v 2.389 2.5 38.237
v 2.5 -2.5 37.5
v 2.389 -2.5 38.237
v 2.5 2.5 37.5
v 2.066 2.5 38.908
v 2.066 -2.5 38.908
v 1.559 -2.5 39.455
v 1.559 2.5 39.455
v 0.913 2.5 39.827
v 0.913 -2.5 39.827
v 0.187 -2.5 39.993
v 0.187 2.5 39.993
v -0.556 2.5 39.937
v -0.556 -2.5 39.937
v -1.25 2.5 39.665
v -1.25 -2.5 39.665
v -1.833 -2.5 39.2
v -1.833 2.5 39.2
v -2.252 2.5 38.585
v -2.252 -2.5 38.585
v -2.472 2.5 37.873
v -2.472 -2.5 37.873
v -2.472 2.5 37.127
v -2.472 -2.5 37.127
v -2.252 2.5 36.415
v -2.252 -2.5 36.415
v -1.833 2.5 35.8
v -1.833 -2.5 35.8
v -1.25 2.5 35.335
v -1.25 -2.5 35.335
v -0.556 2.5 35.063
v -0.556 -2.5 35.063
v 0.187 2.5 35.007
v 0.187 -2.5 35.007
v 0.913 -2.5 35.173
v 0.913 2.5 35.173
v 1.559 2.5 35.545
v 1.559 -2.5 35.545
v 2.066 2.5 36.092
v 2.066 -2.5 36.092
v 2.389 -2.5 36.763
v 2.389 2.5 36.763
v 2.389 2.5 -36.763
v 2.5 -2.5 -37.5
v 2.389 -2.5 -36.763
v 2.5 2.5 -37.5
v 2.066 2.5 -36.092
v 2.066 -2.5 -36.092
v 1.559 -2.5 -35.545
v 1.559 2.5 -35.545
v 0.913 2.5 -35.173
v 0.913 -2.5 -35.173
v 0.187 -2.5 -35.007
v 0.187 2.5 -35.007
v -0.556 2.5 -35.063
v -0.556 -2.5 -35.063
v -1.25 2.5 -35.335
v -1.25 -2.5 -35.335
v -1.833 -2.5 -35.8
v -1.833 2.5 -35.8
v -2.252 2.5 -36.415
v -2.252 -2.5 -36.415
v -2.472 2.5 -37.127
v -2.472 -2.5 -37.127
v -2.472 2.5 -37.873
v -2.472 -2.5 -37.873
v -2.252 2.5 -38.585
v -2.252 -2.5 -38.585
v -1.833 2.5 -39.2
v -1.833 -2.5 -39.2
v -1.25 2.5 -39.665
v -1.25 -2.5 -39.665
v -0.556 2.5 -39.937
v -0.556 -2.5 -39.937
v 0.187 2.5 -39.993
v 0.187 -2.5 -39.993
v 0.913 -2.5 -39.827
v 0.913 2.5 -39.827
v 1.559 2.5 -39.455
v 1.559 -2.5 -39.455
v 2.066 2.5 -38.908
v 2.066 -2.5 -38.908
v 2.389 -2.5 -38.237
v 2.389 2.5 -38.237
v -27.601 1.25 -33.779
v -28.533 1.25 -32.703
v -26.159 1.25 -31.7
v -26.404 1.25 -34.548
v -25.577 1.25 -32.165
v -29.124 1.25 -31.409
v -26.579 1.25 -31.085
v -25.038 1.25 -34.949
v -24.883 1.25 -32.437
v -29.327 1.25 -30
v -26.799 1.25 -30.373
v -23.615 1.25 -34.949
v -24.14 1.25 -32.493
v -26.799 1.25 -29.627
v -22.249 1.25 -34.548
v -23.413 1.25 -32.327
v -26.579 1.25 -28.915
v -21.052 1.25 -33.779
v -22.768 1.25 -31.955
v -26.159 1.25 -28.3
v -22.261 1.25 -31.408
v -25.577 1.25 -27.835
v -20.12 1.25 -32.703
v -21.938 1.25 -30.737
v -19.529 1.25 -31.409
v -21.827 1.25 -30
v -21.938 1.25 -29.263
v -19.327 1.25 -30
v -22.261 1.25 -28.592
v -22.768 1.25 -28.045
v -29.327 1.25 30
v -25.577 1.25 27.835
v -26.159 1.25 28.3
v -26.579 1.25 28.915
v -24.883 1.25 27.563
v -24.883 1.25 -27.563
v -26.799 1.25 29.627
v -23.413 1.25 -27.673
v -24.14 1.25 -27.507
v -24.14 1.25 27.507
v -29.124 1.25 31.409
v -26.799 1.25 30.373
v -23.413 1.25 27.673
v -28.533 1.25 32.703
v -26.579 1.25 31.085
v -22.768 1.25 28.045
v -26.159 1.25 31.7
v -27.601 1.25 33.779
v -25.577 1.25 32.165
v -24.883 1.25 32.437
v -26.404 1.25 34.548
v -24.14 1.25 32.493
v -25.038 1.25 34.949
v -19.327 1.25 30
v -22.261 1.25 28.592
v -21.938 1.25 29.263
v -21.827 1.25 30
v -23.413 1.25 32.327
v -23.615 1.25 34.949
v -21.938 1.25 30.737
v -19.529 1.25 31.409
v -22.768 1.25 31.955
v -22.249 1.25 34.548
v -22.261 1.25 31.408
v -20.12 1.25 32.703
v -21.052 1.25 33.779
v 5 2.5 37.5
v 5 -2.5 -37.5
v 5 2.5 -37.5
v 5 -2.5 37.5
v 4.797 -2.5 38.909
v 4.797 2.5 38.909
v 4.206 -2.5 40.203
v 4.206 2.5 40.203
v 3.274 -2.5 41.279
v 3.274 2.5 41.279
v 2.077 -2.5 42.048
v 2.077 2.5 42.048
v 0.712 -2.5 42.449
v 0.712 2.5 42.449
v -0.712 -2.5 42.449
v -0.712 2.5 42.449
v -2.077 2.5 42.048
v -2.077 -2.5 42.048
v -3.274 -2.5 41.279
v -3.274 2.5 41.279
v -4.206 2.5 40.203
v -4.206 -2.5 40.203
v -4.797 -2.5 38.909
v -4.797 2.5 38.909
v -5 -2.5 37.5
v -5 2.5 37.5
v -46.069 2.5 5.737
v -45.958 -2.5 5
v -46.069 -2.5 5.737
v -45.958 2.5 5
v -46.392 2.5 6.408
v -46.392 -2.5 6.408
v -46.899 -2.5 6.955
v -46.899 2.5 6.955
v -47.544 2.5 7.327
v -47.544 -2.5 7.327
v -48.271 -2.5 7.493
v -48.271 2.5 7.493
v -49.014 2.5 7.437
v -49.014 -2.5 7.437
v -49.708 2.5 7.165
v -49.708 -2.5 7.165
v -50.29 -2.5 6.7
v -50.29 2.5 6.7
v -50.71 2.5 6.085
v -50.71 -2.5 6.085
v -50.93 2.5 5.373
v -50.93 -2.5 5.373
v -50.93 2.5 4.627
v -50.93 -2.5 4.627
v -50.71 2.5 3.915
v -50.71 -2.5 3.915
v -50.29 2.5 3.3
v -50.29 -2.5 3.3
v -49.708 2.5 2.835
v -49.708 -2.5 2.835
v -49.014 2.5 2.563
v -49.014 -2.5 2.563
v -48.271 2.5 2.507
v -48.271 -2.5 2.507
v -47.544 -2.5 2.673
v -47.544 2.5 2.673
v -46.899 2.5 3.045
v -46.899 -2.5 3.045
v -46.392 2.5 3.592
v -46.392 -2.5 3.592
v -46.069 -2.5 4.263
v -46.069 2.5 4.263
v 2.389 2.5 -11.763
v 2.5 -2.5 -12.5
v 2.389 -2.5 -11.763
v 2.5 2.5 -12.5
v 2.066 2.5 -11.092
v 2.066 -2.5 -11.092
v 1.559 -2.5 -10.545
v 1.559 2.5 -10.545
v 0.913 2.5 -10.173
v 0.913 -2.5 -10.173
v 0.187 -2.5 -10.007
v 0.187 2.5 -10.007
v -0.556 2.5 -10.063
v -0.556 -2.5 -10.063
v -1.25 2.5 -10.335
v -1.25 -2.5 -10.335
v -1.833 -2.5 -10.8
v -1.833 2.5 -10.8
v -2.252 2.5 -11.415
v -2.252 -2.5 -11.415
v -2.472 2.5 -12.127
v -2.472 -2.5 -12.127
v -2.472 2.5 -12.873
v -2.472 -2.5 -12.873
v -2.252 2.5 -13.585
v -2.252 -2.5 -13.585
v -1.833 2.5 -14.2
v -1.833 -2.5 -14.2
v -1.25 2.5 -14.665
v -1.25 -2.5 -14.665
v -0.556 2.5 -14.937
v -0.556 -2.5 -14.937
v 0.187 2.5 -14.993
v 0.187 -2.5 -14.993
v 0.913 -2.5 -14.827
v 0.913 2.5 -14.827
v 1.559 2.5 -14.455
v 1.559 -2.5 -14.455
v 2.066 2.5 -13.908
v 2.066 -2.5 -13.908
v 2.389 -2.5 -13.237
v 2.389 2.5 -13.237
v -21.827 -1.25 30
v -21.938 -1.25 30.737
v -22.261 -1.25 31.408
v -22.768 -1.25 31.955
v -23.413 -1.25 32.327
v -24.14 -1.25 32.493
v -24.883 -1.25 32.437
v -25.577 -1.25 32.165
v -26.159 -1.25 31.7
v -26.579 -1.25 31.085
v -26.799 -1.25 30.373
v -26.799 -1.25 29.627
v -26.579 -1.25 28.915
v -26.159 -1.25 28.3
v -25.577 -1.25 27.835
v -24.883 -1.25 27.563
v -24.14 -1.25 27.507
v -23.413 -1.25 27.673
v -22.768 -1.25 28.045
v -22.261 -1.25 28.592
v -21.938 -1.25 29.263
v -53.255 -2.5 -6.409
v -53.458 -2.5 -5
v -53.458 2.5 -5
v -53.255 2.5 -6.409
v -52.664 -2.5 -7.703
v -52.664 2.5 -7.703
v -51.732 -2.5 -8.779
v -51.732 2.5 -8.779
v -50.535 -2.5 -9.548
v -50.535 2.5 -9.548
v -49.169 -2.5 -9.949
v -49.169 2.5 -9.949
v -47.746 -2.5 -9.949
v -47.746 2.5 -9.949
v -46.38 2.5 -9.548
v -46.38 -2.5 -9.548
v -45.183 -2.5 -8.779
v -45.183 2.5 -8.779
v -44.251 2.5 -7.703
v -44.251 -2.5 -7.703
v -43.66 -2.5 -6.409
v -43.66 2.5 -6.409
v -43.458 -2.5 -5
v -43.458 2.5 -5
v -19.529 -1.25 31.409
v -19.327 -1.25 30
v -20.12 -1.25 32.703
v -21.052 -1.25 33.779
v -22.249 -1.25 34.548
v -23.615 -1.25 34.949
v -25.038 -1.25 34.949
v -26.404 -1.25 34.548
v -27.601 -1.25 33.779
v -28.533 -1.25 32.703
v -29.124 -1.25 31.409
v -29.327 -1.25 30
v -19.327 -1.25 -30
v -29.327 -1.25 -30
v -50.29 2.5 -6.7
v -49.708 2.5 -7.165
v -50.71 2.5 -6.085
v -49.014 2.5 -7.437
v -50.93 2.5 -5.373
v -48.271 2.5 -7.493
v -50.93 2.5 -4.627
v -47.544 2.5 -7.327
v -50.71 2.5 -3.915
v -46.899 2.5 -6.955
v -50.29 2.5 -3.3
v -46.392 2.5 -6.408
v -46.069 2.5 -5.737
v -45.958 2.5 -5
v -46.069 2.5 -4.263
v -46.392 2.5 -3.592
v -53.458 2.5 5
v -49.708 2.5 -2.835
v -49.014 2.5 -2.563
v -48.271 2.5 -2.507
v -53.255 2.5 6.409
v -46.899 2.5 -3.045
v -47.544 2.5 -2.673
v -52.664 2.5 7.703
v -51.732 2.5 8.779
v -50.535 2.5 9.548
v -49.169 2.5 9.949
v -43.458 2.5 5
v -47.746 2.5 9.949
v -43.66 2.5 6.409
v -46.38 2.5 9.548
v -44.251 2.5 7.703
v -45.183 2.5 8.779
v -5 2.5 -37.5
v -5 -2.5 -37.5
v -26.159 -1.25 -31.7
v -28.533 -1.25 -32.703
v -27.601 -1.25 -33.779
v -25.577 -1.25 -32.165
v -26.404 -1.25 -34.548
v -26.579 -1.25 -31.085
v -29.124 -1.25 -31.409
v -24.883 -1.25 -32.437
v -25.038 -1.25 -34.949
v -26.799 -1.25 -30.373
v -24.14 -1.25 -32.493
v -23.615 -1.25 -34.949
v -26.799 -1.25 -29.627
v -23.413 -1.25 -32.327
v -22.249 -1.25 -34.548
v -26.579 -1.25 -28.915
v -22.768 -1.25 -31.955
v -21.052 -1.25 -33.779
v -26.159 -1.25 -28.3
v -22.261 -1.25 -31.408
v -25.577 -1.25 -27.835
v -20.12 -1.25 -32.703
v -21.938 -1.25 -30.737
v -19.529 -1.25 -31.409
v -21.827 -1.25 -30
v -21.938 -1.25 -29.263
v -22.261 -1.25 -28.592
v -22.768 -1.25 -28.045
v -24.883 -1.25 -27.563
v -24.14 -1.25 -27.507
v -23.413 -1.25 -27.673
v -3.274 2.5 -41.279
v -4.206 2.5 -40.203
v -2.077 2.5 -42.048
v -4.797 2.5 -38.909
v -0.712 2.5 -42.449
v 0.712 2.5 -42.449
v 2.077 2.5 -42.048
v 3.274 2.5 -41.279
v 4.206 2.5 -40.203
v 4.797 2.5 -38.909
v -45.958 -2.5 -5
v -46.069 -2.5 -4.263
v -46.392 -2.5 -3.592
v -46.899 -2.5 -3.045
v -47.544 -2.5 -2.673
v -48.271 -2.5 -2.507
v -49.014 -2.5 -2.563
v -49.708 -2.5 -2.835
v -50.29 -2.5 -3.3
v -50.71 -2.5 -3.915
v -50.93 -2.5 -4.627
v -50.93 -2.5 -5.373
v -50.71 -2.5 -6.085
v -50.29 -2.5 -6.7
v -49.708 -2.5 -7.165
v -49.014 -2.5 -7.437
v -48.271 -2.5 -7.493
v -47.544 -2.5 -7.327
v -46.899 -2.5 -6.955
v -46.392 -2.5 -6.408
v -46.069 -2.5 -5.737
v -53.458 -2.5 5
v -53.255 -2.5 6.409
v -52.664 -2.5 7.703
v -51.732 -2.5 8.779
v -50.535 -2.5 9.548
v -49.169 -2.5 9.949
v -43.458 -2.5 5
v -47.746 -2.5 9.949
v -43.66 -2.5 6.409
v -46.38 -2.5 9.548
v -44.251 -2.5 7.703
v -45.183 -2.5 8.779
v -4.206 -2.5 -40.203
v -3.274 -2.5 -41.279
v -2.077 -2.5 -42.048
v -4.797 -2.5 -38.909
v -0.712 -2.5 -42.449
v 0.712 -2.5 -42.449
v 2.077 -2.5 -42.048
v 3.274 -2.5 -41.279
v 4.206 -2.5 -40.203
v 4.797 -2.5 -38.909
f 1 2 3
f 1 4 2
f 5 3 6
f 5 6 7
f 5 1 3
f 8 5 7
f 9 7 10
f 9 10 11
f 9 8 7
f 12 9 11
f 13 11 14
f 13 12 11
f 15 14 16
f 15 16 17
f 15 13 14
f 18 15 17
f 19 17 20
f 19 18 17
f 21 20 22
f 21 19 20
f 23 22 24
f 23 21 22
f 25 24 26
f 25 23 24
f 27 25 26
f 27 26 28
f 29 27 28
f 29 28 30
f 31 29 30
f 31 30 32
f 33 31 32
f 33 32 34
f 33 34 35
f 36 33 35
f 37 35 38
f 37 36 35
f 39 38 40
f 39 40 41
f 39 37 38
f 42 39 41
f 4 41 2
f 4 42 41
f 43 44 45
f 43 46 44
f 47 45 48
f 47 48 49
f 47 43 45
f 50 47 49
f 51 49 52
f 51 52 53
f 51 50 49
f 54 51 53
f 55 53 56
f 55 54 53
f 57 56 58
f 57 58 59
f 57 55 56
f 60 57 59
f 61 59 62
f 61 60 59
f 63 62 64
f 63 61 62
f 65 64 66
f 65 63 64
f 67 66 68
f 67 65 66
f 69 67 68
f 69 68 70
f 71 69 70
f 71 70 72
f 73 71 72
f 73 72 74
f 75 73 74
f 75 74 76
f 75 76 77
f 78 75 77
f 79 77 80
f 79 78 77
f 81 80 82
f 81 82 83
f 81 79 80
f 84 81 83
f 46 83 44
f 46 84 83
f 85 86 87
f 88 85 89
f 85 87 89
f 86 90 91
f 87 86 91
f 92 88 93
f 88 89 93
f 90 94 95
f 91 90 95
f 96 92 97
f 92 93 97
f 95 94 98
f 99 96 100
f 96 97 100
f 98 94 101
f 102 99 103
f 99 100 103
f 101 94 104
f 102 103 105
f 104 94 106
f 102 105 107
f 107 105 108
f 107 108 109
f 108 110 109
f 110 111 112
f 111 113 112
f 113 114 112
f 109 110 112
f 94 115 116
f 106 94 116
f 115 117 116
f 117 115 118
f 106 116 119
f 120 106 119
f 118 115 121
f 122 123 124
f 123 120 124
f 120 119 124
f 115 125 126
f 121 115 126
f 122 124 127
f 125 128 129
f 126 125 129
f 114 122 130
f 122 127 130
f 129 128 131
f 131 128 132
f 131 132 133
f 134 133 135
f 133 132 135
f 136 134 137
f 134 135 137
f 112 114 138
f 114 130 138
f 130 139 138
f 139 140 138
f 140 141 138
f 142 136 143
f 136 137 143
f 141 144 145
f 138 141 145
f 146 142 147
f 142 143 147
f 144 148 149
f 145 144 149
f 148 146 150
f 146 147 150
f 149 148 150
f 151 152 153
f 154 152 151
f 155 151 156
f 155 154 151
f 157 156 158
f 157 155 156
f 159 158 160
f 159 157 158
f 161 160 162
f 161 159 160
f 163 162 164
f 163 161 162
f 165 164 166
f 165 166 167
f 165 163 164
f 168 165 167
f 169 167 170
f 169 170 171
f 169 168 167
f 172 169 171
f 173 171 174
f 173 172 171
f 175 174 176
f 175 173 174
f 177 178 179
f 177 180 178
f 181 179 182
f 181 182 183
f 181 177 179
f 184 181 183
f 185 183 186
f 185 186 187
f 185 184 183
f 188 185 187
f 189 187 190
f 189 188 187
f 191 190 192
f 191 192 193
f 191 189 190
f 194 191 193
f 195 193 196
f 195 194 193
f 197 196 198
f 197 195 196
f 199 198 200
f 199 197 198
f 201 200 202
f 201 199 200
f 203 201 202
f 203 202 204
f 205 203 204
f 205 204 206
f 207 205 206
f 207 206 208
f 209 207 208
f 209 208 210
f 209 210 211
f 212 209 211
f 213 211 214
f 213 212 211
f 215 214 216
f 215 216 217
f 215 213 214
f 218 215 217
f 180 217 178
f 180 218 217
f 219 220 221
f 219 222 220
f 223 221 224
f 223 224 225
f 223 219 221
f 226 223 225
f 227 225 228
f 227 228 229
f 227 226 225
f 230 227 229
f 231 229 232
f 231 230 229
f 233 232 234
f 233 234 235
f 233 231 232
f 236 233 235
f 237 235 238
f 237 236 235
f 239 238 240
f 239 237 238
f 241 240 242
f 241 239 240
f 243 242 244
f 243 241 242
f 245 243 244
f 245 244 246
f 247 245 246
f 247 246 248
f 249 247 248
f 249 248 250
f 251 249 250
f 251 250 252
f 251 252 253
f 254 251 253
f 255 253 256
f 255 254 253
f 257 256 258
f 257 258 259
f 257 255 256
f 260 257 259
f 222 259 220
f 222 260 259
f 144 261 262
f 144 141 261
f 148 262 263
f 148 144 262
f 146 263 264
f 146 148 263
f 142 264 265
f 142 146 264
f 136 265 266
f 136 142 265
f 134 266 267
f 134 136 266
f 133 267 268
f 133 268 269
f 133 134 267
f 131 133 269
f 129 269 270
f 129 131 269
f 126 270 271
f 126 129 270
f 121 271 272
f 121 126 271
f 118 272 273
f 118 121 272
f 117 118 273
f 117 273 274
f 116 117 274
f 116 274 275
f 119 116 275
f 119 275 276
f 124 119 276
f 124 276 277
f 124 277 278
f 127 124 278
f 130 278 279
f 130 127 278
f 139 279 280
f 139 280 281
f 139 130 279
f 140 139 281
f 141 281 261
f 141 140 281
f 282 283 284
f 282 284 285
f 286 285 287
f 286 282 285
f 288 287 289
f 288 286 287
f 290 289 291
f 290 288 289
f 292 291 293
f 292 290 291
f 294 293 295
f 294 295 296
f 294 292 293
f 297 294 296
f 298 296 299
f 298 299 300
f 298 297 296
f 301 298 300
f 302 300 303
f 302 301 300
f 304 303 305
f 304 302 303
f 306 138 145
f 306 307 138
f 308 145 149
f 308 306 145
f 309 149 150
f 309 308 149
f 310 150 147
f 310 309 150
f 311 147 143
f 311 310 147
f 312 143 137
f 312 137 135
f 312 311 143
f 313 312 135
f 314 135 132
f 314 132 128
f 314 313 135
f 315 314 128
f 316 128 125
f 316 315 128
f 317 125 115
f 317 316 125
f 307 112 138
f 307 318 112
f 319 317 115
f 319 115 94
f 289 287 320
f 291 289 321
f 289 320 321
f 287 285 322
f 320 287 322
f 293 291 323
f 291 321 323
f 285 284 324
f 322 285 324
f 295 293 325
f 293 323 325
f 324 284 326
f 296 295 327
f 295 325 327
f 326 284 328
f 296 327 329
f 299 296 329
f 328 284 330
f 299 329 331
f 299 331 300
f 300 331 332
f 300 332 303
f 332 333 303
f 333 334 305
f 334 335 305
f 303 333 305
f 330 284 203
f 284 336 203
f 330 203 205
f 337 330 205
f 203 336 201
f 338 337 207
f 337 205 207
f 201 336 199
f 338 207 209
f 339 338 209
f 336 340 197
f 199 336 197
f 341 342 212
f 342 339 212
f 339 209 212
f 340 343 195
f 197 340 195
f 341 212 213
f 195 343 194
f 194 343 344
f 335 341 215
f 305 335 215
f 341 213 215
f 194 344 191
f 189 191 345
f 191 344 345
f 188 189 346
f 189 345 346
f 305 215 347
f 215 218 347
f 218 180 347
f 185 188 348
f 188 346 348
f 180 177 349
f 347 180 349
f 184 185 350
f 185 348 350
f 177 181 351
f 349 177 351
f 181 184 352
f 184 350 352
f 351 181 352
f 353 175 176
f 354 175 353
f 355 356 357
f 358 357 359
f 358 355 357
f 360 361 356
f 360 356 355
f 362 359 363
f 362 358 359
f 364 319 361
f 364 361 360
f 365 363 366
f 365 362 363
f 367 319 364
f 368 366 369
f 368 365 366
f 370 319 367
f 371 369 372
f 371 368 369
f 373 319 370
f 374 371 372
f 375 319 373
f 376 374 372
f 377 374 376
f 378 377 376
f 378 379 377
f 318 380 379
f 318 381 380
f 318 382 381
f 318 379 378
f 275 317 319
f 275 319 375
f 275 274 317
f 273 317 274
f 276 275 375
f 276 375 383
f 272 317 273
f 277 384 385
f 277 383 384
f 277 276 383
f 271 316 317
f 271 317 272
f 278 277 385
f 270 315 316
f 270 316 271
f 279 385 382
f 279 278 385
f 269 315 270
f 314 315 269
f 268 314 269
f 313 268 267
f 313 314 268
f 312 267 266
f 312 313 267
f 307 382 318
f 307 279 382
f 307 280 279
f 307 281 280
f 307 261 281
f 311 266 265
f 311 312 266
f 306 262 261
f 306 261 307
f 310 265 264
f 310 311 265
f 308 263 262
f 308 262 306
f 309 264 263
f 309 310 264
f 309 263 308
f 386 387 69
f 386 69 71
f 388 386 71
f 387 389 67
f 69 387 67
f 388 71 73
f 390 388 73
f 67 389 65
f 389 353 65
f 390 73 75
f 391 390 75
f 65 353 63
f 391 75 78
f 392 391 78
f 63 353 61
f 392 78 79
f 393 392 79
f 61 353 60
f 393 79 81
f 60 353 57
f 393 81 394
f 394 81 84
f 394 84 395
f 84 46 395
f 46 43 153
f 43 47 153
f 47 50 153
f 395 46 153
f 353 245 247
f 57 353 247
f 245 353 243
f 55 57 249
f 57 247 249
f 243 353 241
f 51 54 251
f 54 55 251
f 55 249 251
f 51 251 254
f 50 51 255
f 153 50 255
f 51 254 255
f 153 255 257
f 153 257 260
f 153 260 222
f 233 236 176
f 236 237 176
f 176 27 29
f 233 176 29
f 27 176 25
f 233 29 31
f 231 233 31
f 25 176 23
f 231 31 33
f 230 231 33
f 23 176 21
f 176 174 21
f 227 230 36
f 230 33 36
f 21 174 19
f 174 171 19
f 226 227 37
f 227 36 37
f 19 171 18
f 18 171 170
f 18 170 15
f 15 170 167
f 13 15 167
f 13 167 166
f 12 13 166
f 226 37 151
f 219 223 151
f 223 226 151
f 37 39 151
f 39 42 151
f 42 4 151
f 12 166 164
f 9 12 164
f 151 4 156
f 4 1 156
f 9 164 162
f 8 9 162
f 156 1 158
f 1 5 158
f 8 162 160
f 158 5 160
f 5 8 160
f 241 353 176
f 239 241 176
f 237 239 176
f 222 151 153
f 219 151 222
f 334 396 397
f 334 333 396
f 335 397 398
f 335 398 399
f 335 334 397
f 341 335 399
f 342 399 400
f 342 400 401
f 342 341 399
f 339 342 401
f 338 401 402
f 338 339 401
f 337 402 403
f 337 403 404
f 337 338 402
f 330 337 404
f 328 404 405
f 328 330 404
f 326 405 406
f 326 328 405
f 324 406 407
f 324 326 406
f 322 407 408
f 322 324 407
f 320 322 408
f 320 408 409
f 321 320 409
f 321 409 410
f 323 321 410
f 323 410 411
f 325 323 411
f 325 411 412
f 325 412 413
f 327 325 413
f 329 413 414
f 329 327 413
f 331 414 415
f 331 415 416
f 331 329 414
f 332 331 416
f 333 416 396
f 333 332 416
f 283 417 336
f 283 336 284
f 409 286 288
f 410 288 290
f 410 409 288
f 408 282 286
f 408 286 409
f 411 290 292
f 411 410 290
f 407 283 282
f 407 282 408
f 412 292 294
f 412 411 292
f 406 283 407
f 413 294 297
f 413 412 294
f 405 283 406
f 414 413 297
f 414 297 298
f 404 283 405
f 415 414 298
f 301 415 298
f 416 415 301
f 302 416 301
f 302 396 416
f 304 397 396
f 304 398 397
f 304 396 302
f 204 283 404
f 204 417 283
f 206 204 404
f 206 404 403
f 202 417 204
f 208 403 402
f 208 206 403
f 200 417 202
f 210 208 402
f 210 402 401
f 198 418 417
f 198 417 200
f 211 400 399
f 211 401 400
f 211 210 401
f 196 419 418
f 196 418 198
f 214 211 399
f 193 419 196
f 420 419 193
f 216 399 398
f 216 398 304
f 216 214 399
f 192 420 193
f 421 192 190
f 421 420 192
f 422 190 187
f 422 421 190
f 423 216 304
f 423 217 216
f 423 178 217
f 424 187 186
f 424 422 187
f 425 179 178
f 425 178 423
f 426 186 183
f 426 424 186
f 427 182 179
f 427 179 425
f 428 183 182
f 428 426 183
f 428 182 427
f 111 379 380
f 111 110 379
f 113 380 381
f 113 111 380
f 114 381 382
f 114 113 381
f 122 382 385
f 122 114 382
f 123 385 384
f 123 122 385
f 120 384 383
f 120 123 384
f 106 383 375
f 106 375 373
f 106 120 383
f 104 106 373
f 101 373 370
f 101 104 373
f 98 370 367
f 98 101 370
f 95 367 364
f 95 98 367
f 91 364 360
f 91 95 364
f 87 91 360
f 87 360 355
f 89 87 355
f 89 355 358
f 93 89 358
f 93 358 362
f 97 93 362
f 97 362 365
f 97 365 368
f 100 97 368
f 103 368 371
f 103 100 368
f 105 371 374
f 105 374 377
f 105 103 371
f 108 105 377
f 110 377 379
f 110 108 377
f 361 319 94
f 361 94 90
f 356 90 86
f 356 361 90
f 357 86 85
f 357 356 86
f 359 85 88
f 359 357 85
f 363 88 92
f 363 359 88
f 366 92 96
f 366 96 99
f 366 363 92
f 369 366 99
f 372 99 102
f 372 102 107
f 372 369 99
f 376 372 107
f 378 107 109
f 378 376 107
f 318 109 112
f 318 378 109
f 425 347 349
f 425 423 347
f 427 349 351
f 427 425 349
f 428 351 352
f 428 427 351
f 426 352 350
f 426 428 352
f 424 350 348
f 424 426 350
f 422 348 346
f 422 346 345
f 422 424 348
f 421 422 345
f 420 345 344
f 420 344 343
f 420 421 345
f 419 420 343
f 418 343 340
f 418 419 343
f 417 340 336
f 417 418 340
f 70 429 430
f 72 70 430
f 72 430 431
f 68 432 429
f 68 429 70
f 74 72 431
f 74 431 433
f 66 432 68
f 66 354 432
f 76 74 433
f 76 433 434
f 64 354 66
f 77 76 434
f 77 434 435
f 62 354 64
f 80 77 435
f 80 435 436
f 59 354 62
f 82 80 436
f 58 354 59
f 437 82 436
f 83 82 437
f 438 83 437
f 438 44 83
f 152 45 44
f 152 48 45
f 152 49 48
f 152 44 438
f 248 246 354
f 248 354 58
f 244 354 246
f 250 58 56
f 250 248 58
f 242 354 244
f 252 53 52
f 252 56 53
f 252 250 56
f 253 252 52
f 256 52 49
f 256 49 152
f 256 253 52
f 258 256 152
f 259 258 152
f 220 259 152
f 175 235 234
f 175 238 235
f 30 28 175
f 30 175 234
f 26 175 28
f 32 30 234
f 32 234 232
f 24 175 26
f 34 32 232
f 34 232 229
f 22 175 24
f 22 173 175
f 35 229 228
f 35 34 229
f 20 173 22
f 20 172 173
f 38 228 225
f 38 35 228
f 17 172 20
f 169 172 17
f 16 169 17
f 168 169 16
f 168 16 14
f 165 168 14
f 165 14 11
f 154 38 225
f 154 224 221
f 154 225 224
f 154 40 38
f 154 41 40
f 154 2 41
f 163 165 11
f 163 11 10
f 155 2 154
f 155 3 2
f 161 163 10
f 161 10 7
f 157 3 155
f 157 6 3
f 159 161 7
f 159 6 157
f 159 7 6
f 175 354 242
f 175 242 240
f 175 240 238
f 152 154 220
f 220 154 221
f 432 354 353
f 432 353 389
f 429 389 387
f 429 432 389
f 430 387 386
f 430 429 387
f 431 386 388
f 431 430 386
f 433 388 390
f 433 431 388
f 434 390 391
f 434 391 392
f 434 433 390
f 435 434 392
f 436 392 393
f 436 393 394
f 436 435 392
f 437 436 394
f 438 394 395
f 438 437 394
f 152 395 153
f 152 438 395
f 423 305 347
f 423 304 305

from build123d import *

# Parameters (mm, degrees)
F0_R     = 2.5
F1_DEPTH = 2.5
F2_R     = 2.5
F3_DEPTH = 1.25
F4_R     = 2.5
F5_DEPTH = 2.5


# Not quite as in the source:
# - a feature names something its author has since deleted; it is built from what else it names


with BuildPart() as f1:
    # F0 (on Front) → F1 (new body, symmetric)
    with BuildSketch(Plane.XZ):
        with BuildLine():
            Line((5, 0), (5, 37.5))
            ThreePointArc((5, 37.5), (0, 42.5), (-5, 37.5))
            Line((-5, 37.5), (-5, 0))
            Line((-5, 0), (-5, -37.5))
            ThreePointArc((-5, -37.5), (0, -42.5), (5, -37.5))
            Line((5, -37.5), (5, 0))
        make_face()
        with Locations((0, -37.5)):
            Circle(F0_R, mode=Mode.SUBTRACT)
        with Locations((0, -12.5)):
            Circle(F0_R, mode=Mode.SUBTRACT)
        with Locations((0, 37.5)):
            Circle(F0_R, mode=Mode.SUBTRACT)
    extrude(amount=F1_DEPTH, both=True)


with BuildPart() as f3:
    # F2 (on Front) → F3 (new body, symmetric)
    with BuildSketch(Plane.XZ):
        with BuildLine():
            Line((-19.3265285343, 0), (-19.3265285343, 30))
            ThreePointArc((-19.3265285343, 30), (-24.3265285343, 35), (-29.3265285343, 30))
            Line((-29.3265285343, 30), (-29.3265285343, 0))
            Line((-29.3265285343, 0), (-29.3265285343, -30))
            ThreePointArc((-29.3265285343, -30), (-24.3265285343, -35), (-19.3265285343, -30))
            Line((-19.3265285343, -30), (-19.3265285343, 0))
        make_face()
        with Locations((-24.3265285343, -30)):
            Circle(F2_R, mode=Mode.SUBTRACT)
        with Locations((-24.3265285343, 30)):
            Circle(F2_R, mode=Mode.SUBTRACT)
    extrude(amount=F3_DEPTH, both=True)


with BuildPart() as f5:
    # F4 (on Front) → F5 (new body, symmetric)
    with BuildSketch(Plane.XZ):
        with BuildLine():
            Line((-43.4575378895, 0), (-43.4575378895, 5))
            ThreePointArc((-43.4575378895, 5), (-48.4575378895, 10), (-53.4575378895, 5))
            Line((-53.4575378895, 5), (-53.4575378895, 0))
            Line((-53.4575378895, 0), (-53.4575378895, -5))
            ThreePointArc((-53.4575378895, -5), (-48.4575378895, -10), (-43.4575378895, -5))
            Line((-43.4575378895, -5), (-43.4575378895, 0))
        make_face()
        with Locations((-48.4575378895, -5)):
            Circle(F4_R, mode=Mode.SUBTRACT)
        with Locations((-48.4575378895, 5)):
            Circle(F4_R, mode=Mode.SUBTRACT)
    extrude(amount=F5_DEPTH, both=True)


solid = Compound([f1.part, f3.part, f5.part])
